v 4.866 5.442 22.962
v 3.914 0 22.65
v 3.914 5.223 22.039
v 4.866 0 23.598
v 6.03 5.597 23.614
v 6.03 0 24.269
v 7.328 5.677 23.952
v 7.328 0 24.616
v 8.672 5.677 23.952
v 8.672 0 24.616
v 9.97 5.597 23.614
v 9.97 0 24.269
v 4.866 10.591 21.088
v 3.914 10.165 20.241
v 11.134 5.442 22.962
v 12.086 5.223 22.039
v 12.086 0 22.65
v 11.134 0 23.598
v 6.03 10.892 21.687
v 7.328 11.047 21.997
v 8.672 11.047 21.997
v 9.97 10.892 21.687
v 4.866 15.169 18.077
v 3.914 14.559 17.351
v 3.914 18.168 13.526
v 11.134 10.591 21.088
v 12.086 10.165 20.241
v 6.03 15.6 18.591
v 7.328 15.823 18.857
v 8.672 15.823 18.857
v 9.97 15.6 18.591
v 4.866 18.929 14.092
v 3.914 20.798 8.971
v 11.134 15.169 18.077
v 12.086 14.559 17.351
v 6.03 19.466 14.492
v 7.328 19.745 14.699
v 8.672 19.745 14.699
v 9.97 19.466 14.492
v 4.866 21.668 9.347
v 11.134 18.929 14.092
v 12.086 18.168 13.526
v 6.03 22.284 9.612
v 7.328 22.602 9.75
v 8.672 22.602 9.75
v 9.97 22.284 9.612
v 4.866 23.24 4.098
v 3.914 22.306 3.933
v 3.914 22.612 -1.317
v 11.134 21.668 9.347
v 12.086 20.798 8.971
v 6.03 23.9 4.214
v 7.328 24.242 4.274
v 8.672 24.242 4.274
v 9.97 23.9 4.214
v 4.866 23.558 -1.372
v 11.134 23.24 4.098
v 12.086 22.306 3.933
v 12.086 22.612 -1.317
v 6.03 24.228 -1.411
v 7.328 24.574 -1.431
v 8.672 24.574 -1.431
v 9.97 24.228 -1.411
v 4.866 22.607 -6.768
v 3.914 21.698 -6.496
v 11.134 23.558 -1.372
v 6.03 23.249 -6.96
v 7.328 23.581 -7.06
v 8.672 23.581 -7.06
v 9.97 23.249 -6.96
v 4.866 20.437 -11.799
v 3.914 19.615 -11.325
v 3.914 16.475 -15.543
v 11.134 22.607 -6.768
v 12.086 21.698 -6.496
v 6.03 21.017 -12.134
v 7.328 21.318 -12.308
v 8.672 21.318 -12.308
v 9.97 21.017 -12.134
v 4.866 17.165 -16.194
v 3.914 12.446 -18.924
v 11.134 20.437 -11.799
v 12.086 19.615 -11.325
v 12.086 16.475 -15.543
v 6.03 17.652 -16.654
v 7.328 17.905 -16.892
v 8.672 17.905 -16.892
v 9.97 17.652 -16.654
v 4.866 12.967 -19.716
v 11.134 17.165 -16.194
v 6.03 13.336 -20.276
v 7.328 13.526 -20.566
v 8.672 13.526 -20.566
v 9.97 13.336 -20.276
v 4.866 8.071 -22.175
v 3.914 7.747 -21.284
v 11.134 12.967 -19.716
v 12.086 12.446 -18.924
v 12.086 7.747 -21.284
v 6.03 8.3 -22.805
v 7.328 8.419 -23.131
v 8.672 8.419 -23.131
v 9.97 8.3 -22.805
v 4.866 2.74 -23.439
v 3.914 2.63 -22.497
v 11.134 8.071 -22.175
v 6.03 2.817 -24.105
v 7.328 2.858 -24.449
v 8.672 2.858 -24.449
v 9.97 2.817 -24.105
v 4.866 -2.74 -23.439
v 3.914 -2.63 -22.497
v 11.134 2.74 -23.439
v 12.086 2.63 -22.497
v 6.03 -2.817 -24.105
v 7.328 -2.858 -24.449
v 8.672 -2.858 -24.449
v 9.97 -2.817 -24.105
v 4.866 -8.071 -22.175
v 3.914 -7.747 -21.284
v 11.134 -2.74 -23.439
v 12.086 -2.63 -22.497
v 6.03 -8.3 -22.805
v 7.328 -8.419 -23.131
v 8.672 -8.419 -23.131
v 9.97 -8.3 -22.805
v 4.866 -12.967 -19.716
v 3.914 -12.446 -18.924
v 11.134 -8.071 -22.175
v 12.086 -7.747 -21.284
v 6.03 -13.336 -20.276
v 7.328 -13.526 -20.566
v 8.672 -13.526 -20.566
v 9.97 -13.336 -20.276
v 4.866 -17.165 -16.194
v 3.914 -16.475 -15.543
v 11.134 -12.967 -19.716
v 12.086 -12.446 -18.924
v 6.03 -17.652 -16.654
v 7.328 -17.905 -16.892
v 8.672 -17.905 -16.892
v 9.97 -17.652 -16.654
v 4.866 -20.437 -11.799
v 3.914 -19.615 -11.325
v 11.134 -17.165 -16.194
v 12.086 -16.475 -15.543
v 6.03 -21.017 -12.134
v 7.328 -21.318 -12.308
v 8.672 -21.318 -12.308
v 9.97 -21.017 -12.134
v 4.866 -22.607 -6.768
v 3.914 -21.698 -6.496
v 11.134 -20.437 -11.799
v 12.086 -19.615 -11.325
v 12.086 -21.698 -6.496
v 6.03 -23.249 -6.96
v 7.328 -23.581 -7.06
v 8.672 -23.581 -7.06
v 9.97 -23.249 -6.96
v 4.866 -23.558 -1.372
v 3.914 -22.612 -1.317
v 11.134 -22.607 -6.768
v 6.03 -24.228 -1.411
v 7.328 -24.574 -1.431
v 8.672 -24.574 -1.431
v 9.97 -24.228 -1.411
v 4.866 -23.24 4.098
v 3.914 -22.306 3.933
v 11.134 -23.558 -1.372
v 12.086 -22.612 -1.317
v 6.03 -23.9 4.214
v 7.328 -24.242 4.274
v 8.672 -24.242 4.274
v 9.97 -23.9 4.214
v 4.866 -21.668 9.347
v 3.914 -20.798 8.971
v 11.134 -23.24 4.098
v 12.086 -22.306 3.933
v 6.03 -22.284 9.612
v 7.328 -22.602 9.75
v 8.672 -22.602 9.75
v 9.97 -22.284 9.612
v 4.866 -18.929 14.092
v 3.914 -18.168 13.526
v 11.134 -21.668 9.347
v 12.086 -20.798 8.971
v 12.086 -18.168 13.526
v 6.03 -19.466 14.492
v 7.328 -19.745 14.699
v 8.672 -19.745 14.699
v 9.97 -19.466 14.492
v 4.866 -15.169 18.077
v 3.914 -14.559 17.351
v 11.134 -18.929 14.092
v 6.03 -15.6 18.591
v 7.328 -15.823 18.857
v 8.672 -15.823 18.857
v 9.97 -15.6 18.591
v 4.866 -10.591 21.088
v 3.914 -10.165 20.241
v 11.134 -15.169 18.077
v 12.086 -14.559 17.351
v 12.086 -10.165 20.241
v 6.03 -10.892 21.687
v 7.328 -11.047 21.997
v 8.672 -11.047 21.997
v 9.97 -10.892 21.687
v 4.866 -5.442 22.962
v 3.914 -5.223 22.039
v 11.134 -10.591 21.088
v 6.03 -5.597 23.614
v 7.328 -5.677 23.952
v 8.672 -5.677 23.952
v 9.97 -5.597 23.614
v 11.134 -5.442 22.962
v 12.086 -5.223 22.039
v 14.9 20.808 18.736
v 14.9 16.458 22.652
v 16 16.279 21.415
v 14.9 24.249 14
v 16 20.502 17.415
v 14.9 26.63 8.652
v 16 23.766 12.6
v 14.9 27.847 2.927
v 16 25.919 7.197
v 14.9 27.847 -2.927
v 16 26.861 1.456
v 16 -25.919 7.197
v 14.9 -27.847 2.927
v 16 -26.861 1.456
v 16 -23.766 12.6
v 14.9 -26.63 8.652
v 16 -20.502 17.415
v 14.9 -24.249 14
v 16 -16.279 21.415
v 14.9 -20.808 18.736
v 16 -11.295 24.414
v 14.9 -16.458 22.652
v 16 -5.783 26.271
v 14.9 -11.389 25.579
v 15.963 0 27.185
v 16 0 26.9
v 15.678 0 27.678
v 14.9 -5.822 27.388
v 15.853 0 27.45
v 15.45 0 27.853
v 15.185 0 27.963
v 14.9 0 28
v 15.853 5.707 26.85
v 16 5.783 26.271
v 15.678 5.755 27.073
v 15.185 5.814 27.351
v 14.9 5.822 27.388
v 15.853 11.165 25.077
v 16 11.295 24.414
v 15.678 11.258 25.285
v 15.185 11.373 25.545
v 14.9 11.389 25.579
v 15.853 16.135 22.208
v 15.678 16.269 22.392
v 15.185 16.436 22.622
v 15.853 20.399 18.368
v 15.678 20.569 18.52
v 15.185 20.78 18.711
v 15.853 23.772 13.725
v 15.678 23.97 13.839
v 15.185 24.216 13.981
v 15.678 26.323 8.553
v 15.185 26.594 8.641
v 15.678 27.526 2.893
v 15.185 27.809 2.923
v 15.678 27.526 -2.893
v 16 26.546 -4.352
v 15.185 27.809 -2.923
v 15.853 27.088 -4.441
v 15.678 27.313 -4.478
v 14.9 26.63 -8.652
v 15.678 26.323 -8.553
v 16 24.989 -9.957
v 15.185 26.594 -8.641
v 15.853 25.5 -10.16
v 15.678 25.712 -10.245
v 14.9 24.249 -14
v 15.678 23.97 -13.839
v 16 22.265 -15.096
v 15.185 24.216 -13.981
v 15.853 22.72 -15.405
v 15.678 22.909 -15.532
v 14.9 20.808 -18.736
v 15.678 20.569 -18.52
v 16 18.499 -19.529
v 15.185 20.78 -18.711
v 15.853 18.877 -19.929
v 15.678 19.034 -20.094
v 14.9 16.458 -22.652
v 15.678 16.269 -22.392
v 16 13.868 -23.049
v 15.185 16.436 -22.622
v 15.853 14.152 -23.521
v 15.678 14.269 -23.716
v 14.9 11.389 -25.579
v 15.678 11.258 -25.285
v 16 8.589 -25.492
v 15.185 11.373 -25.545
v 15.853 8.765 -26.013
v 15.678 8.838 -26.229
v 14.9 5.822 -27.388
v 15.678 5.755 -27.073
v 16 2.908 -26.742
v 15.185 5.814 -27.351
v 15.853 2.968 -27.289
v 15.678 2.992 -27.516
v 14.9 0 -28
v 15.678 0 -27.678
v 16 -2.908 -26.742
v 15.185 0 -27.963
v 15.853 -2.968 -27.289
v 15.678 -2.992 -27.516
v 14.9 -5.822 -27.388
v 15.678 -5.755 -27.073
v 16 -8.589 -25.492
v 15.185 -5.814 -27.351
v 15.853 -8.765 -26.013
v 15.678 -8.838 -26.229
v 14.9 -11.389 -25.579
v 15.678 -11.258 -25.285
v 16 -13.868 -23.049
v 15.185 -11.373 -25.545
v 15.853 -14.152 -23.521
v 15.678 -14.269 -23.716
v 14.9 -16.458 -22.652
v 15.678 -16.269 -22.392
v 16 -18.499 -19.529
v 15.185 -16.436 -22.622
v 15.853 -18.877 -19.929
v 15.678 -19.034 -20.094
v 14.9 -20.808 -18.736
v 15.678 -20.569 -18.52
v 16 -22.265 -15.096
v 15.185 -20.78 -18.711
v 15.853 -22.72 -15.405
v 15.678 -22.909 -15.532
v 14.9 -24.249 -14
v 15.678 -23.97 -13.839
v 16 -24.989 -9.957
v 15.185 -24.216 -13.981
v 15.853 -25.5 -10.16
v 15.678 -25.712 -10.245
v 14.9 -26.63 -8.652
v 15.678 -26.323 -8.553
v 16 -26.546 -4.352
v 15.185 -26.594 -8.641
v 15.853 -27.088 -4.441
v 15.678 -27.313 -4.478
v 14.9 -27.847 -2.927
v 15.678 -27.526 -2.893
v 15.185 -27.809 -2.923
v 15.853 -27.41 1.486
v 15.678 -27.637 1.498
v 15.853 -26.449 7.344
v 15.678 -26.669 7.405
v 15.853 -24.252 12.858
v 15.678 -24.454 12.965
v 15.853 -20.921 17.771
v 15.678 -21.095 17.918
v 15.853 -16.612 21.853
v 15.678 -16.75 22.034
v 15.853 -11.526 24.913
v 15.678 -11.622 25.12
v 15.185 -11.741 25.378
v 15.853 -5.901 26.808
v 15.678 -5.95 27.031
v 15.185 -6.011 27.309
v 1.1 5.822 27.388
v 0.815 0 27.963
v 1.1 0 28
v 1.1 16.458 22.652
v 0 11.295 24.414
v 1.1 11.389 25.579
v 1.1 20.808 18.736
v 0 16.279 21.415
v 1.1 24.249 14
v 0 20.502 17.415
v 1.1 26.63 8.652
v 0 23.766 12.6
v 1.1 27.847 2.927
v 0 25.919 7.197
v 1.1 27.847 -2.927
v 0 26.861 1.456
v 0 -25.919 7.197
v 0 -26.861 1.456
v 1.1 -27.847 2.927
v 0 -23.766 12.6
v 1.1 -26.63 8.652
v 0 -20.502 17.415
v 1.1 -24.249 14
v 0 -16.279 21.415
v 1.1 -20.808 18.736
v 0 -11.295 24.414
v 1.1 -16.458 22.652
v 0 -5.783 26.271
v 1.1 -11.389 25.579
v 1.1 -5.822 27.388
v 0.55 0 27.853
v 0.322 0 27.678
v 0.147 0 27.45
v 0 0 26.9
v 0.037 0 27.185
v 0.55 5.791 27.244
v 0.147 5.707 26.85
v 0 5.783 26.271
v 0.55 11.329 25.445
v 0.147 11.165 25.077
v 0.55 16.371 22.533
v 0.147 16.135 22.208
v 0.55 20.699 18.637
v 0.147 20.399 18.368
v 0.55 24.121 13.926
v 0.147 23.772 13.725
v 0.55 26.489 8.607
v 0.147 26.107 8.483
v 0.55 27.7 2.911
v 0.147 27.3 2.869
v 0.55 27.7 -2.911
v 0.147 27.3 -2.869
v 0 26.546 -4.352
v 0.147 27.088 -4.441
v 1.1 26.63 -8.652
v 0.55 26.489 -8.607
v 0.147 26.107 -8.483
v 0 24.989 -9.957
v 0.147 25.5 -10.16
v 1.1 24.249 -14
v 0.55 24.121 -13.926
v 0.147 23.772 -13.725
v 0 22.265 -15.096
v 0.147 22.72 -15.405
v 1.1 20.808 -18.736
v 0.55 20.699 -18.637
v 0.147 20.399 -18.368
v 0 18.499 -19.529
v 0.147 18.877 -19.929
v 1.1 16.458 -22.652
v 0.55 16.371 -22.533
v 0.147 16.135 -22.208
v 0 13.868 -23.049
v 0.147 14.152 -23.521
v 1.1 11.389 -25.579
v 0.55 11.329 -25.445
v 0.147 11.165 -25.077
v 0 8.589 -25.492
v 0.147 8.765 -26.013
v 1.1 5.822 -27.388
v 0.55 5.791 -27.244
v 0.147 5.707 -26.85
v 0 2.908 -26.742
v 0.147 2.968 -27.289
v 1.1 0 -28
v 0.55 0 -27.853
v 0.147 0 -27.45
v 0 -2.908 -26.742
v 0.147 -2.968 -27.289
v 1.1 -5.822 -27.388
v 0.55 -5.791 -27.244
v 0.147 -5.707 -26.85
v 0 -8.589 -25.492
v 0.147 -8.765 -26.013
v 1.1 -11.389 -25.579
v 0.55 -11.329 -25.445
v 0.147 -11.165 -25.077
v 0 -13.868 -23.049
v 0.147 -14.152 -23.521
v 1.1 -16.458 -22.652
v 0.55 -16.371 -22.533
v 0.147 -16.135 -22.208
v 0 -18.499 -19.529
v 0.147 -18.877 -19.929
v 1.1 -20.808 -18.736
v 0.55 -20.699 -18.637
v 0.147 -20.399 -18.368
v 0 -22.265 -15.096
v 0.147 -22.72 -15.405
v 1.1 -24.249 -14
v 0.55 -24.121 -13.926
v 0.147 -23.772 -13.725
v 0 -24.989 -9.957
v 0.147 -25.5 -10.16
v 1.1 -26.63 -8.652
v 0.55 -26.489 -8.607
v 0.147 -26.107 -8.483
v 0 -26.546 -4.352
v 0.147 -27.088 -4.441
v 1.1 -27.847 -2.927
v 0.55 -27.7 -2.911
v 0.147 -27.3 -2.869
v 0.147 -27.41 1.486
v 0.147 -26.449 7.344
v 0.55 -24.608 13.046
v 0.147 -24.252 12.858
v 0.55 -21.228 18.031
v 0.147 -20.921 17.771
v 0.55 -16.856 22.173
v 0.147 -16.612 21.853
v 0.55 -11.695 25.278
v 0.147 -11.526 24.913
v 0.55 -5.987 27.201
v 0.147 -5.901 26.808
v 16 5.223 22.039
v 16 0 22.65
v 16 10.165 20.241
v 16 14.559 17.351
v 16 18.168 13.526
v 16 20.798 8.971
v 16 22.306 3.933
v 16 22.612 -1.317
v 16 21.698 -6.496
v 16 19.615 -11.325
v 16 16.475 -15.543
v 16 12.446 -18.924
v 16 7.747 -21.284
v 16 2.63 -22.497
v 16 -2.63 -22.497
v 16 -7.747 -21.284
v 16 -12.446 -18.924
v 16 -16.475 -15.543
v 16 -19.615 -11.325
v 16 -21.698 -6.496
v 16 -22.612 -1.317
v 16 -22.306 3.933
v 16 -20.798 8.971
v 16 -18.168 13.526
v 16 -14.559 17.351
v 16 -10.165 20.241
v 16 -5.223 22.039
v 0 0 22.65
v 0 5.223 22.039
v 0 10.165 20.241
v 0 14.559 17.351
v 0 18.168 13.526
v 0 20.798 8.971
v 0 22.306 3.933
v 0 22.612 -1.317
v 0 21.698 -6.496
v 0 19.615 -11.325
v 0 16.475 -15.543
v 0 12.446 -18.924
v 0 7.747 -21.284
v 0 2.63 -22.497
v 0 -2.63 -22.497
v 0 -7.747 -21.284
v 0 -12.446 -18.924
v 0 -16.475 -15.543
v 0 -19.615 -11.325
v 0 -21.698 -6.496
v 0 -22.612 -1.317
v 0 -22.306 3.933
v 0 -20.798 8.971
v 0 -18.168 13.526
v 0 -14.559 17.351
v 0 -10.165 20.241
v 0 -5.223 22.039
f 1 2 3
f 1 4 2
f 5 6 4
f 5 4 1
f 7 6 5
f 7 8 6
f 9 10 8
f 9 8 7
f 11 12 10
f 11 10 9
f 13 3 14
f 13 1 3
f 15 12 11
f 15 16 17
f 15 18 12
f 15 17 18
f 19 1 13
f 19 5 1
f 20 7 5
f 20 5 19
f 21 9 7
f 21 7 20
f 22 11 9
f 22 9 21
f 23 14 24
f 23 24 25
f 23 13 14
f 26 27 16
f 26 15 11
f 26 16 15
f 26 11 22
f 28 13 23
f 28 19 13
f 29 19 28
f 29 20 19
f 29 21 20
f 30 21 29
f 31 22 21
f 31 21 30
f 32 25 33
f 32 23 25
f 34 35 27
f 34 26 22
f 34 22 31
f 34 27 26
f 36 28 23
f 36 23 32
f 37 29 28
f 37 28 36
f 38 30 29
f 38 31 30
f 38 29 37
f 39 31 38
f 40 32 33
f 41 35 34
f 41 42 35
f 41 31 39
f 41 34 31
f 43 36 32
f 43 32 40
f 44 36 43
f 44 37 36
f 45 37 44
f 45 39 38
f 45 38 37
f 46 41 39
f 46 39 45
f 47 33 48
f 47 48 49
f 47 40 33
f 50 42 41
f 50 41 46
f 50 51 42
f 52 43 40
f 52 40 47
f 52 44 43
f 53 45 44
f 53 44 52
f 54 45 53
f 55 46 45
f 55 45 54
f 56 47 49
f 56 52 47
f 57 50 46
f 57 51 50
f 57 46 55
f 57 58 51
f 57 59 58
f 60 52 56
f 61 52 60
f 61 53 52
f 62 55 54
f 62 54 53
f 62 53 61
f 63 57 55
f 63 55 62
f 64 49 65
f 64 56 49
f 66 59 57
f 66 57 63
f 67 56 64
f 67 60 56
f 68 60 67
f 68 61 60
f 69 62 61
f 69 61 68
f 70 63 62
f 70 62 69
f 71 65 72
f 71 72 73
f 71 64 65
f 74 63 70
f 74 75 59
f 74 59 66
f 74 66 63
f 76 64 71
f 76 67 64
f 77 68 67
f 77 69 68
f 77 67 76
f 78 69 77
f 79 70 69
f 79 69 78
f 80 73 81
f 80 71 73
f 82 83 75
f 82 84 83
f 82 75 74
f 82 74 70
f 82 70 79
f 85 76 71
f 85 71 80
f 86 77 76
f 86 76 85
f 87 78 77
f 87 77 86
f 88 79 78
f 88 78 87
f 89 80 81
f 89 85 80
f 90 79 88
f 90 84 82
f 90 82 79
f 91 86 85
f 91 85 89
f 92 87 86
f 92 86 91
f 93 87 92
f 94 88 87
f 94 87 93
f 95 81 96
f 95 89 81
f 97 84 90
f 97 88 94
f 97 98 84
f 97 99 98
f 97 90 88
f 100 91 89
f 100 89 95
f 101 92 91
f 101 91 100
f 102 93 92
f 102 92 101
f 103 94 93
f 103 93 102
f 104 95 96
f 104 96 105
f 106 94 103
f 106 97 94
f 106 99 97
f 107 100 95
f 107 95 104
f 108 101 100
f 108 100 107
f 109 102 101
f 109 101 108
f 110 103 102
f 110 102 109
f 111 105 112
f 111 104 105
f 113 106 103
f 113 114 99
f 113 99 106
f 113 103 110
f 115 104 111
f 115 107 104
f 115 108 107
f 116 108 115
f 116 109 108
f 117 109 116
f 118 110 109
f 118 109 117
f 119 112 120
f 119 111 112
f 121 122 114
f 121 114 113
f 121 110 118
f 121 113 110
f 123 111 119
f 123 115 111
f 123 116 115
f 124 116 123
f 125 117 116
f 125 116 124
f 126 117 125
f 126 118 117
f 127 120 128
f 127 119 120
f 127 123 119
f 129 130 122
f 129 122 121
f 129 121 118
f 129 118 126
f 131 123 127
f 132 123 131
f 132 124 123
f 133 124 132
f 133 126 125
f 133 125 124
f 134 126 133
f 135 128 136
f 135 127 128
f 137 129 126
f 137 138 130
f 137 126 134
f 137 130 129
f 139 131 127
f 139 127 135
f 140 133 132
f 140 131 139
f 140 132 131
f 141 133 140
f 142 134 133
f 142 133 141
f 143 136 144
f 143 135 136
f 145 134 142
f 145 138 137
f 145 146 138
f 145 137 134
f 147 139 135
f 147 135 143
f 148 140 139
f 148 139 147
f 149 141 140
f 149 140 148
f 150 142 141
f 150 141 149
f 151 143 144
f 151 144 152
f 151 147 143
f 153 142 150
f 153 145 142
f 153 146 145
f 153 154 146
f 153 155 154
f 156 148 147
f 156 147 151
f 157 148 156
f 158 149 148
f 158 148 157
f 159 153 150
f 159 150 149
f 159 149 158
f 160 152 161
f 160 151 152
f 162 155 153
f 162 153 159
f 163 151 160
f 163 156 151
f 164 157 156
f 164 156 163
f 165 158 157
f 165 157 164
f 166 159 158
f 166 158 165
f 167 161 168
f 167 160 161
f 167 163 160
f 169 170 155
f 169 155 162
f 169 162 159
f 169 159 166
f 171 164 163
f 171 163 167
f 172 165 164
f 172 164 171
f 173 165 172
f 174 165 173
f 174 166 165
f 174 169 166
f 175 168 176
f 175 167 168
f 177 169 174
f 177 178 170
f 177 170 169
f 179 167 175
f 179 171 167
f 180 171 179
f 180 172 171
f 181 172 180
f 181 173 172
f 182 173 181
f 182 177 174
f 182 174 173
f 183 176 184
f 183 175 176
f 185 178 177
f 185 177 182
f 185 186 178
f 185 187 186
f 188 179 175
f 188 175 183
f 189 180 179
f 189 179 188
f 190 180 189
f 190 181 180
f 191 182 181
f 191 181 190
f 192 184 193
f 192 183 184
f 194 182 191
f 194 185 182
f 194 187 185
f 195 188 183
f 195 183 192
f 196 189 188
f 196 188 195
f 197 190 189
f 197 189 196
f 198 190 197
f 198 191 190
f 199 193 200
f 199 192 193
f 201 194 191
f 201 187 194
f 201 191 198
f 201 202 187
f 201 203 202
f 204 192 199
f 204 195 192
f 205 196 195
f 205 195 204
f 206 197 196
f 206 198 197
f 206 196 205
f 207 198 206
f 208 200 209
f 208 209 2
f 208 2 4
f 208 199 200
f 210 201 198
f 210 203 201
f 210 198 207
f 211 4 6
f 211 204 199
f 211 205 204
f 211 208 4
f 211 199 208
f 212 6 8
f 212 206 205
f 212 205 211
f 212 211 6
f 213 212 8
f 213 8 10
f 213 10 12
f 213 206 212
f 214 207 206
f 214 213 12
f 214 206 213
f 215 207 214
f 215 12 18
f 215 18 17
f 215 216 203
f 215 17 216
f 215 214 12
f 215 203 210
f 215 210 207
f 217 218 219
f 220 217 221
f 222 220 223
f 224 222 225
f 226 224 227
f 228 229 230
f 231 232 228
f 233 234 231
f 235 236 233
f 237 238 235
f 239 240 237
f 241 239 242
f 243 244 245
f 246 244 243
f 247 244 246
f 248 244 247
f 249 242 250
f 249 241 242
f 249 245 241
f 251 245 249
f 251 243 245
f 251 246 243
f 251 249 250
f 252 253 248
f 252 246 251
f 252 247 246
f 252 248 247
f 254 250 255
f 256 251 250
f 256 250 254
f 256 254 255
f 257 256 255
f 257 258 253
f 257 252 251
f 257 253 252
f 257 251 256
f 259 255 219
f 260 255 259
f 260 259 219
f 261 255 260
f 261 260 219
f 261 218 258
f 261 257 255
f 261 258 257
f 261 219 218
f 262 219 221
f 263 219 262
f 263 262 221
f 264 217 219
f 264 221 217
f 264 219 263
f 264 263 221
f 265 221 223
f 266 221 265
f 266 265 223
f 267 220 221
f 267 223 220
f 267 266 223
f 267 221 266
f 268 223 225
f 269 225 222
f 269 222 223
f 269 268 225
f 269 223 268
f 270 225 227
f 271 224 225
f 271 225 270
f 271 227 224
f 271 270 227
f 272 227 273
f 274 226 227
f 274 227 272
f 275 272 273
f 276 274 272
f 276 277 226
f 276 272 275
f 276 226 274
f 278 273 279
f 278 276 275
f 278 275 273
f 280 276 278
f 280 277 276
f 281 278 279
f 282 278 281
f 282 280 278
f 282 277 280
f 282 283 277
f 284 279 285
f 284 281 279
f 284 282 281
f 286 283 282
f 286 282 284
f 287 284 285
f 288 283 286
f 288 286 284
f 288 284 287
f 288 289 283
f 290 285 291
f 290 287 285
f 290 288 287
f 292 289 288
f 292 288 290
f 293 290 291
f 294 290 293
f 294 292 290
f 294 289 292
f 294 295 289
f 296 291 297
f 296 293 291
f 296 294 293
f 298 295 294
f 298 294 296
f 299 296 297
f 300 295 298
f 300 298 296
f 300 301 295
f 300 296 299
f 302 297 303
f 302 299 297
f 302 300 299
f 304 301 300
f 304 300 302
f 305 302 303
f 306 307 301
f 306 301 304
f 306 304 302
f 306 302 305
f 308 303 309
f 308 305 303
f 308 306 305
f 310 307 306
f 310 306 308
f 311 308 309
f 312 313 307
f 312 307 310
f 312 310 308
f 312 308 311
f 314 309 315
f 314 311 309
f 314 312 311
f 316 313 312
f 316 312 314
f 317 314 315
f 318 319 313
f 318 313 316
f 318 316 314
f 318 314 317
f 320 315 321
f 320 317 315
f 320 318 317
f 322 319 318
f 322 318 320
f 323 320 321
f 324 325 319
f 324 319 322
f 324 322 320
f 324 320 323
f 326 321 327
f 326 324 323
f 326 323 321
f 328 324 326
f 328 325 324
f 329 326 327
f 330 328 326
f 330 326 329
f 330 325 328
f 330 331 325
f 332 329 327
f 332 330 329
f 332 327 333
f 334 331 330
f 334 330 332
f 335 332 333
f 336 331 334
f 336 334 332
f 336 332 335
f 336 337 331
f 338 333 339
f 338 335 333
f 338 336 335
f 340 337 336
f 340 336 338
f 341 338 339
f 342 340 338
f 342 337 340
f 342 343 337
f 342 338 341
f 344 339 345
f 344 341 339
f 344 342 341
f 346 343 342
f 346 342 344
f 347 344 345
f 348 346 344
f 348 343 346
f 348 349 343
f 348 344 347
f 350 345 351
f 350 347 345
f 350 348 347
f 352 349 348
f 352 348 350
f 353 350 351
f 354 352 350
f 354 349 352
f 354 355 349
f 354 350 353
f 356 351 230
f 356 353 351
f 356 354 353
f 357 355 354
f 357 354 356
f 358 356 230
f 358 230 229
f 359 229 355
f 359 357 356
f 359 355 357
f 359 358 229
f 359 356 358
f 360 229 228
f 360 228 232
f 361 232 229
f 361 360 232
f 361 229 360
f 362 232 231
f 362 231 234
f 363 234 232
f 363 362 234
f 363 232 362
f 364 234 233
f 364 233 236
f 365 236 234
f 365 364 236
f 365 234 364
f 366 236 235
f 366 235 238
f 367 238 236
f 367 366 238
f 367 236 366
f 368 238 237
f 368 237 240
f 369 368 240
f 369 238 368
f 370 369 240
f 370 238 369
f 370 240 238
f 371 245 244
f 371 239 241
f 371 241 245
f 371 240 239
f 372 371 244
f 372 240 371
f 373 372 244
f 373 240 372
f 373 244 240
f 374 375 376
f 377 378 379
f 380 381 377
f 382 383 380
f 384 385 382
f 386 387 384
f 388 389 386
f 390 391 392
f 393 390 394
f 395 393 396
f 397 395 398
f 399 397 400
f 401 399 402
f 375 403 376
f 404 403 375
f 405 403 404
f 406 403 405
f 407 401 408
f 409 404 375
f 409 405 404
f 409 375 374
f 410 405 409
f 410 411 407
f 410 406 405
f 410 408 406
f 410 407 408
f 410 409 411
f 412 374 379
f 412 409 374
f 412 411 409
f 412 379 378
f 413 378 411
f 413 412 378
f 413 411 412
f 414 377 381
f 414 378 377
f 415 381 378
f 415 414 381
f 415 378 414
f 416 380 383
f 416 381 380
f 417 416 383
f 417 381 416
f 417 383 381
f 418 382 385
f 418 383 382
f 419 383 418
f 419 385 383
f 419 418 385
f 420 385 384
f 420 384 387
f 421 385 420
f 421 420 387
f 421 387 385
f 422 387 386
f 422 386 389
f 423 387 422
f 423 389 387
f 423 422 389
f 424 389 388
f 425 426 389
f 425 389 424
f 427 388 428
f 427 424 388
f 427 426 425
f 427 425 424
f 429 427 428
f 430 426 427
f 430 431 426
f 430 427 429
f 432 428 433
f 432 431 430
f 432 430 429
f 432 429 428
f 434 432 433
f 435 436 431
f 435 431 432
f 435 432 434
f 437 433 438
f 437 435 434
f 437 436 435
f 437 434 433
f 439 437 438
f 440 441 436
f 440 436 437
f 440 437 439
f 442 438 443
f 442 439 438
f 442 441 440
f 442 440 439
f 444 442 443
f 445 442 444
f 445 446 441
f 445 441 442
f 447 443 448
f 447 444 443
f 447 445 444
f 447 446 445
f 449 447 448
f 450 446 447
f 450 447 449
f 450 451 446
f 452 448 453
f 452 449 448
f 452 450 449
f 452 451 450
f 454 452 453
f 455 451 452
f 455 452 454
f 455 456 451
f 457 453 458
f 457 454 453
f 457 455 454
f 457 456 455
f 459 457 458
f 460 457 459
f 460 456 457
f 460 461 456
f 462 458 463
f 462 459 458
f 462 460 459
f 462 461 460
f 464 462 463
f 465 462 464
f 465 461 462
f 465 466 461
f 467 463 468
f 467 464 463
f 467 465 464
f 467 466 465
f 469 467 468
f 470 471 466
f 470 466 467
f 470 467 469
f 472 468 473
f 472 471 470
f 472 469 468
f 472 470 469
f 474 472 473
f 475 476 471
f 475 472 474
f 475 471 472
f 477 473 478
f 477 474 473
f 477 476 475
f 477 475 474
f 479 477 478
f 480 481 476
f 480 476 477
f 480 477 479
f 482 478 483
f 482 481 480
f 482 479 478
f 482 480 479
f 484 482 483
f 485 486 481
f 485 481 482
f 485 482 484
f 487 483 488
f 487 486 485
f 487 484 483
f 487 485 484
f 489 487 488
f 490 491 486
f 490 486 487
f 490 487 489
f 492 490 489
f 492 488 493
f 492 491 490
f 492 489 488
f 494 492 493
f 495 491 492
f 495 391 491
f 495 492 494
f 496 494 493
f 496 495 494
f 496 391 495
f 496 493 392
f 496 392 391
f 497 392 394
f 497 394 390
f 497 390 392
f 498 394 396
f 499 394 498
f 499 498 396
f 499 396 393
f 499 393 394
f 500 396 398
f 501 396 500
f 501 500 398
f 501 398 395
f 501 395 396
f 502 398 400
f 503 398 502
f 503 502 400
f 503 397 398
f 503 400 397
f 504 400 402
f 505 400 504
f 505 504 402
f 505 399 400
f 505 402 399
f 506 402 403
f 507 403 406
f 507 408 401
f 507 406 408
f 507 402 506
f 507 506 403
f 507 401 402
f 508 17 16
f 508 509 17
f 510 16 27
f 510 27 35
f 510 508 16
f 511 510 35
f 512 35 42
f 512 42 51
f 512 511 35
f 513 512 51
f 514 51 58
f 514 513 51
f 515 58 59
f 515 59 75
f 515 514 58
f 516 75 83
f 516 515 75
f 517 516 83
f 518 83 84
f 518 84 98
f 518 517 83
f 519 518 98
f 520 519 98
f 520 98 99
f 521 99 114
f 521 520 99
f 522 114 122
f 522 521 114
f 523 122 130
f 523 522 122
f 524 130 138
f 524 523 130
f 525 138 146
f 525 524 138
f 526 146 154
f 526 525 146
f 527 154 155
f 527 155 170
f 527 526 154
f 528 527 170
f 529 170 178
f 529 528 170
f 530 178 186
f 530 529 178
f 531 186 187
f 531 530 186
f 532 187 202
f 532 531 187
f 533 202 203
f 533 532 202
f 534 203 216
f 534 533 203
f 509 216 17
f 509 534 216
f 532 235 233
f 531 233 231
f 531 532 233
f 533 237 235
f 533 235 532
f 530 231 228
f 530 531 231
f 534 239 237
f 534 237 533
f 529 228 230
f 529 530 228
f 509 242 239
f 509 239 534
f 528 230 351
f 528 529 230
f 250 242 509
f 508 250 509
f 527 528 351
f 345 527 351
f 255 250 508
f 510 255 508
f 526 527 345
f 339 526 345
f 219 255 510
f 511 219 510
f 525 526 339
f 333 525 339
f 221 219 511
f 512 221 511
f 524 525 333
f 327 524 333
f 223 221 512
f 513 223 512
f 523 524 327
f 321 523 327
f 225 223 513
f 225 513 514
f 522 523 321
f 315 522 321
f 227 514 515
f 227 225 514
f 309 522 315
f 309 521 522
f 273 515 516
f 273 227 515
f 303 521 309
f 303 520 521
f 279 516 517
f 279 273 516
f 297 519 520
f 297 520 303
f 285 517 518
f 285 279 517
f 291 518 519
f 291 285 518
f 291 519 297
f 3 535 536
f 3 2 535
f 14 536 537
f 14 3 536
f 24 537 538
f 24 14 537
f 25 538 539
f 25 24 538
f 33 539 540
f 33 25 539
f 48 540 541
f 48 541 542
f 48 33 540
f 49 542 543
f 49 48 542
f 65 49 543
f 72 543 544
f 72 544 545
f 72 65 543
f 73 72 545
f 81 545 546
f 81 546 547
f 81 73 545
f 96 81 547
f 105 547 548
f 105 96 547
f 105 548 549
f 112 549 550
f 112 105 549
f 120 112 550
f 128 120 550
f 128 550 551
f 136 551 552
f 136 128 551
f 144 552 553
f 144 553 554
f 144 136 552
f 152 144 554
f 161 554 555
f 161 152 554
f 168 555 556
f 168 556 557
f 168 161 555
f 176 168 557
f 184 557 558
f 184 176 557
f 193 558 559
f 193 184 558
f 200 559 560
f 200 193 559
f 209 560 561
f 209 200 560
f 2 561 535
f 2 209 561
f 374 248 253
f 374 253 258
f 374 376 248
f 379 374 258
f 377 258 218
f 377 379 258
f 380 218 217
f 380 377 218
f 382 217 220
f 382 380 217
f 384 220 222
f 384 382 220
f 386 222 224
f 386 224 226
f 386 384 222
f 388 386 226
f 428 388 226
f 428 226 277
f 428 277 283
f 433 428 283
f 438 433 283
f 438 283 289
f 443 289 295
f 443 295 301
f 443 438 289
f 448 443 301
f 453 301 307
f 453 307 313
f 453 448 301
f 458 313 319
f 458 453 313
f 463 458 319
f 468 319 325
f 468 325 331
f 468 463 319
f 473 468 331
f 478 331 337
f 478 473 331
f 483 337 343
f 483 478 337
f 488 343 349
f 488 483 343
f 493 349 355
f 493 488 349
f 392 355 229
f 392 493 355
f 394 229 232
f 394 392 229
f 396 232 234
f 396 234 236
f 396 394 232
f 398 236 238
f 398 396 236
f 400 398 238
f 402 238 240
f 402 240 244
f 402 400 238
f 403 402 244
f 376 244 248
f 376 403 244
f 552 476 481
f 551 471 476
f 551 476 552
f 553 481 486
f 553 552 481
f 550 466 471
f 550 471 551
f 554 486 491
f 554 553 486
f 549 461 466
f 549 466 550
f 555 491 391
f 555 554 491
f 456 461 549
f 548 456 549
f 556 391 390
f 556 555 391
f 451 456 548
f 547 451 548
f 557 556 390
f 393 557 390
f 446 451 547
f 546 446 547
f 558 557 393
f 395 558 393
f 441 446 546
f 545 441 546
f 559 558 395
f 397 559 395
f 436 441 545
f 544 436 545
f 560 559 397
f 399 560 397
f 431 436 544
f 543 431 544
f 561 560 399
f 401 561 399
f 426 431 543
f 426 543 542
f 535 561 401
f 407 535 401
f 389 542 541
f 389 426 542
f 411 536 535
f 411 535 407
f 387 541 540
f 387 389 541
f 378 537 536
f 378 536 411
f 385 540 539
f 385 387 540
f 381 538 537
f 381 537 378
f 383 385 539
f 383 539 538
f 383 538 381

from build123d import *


with BuildPart() as part:
    # Sketch1 → Revolução1 (revolve)
    with BuildSketch(Plane.XY, mode=Mode.PRIVATE) as revolu_o1_sk:
        with BuildLine():
            Line((0, 26.9), (0, 22.65))
            Line((0, 22.65), (3.913688674, 22.65))
            ThreePointArc((3.913688674, 22.65), (8, 24.6595), (12.086311326, 22.65))
            Line((12.086311326, 22.65), (16, 22.65))
            Line((16, 22.65), (16, 26.9))
            ThreePointArc((16, 26.9), (15.677817459, 27.677817459), (14.9, 28))
            Line((14.9, 28), (1.1, 28))
            ThreePointArc((1.1, 28), (0.322182541, 27.677817459), (0, 26.9))
        make_face()
    revolve(revolu_o1_sk.sketch.rotate(Axis((200, 0, 0), (-1, 0, 0)), 270), axis=Axis((200, 0, 0), (-1, 0, 0)))


solid = part.part
